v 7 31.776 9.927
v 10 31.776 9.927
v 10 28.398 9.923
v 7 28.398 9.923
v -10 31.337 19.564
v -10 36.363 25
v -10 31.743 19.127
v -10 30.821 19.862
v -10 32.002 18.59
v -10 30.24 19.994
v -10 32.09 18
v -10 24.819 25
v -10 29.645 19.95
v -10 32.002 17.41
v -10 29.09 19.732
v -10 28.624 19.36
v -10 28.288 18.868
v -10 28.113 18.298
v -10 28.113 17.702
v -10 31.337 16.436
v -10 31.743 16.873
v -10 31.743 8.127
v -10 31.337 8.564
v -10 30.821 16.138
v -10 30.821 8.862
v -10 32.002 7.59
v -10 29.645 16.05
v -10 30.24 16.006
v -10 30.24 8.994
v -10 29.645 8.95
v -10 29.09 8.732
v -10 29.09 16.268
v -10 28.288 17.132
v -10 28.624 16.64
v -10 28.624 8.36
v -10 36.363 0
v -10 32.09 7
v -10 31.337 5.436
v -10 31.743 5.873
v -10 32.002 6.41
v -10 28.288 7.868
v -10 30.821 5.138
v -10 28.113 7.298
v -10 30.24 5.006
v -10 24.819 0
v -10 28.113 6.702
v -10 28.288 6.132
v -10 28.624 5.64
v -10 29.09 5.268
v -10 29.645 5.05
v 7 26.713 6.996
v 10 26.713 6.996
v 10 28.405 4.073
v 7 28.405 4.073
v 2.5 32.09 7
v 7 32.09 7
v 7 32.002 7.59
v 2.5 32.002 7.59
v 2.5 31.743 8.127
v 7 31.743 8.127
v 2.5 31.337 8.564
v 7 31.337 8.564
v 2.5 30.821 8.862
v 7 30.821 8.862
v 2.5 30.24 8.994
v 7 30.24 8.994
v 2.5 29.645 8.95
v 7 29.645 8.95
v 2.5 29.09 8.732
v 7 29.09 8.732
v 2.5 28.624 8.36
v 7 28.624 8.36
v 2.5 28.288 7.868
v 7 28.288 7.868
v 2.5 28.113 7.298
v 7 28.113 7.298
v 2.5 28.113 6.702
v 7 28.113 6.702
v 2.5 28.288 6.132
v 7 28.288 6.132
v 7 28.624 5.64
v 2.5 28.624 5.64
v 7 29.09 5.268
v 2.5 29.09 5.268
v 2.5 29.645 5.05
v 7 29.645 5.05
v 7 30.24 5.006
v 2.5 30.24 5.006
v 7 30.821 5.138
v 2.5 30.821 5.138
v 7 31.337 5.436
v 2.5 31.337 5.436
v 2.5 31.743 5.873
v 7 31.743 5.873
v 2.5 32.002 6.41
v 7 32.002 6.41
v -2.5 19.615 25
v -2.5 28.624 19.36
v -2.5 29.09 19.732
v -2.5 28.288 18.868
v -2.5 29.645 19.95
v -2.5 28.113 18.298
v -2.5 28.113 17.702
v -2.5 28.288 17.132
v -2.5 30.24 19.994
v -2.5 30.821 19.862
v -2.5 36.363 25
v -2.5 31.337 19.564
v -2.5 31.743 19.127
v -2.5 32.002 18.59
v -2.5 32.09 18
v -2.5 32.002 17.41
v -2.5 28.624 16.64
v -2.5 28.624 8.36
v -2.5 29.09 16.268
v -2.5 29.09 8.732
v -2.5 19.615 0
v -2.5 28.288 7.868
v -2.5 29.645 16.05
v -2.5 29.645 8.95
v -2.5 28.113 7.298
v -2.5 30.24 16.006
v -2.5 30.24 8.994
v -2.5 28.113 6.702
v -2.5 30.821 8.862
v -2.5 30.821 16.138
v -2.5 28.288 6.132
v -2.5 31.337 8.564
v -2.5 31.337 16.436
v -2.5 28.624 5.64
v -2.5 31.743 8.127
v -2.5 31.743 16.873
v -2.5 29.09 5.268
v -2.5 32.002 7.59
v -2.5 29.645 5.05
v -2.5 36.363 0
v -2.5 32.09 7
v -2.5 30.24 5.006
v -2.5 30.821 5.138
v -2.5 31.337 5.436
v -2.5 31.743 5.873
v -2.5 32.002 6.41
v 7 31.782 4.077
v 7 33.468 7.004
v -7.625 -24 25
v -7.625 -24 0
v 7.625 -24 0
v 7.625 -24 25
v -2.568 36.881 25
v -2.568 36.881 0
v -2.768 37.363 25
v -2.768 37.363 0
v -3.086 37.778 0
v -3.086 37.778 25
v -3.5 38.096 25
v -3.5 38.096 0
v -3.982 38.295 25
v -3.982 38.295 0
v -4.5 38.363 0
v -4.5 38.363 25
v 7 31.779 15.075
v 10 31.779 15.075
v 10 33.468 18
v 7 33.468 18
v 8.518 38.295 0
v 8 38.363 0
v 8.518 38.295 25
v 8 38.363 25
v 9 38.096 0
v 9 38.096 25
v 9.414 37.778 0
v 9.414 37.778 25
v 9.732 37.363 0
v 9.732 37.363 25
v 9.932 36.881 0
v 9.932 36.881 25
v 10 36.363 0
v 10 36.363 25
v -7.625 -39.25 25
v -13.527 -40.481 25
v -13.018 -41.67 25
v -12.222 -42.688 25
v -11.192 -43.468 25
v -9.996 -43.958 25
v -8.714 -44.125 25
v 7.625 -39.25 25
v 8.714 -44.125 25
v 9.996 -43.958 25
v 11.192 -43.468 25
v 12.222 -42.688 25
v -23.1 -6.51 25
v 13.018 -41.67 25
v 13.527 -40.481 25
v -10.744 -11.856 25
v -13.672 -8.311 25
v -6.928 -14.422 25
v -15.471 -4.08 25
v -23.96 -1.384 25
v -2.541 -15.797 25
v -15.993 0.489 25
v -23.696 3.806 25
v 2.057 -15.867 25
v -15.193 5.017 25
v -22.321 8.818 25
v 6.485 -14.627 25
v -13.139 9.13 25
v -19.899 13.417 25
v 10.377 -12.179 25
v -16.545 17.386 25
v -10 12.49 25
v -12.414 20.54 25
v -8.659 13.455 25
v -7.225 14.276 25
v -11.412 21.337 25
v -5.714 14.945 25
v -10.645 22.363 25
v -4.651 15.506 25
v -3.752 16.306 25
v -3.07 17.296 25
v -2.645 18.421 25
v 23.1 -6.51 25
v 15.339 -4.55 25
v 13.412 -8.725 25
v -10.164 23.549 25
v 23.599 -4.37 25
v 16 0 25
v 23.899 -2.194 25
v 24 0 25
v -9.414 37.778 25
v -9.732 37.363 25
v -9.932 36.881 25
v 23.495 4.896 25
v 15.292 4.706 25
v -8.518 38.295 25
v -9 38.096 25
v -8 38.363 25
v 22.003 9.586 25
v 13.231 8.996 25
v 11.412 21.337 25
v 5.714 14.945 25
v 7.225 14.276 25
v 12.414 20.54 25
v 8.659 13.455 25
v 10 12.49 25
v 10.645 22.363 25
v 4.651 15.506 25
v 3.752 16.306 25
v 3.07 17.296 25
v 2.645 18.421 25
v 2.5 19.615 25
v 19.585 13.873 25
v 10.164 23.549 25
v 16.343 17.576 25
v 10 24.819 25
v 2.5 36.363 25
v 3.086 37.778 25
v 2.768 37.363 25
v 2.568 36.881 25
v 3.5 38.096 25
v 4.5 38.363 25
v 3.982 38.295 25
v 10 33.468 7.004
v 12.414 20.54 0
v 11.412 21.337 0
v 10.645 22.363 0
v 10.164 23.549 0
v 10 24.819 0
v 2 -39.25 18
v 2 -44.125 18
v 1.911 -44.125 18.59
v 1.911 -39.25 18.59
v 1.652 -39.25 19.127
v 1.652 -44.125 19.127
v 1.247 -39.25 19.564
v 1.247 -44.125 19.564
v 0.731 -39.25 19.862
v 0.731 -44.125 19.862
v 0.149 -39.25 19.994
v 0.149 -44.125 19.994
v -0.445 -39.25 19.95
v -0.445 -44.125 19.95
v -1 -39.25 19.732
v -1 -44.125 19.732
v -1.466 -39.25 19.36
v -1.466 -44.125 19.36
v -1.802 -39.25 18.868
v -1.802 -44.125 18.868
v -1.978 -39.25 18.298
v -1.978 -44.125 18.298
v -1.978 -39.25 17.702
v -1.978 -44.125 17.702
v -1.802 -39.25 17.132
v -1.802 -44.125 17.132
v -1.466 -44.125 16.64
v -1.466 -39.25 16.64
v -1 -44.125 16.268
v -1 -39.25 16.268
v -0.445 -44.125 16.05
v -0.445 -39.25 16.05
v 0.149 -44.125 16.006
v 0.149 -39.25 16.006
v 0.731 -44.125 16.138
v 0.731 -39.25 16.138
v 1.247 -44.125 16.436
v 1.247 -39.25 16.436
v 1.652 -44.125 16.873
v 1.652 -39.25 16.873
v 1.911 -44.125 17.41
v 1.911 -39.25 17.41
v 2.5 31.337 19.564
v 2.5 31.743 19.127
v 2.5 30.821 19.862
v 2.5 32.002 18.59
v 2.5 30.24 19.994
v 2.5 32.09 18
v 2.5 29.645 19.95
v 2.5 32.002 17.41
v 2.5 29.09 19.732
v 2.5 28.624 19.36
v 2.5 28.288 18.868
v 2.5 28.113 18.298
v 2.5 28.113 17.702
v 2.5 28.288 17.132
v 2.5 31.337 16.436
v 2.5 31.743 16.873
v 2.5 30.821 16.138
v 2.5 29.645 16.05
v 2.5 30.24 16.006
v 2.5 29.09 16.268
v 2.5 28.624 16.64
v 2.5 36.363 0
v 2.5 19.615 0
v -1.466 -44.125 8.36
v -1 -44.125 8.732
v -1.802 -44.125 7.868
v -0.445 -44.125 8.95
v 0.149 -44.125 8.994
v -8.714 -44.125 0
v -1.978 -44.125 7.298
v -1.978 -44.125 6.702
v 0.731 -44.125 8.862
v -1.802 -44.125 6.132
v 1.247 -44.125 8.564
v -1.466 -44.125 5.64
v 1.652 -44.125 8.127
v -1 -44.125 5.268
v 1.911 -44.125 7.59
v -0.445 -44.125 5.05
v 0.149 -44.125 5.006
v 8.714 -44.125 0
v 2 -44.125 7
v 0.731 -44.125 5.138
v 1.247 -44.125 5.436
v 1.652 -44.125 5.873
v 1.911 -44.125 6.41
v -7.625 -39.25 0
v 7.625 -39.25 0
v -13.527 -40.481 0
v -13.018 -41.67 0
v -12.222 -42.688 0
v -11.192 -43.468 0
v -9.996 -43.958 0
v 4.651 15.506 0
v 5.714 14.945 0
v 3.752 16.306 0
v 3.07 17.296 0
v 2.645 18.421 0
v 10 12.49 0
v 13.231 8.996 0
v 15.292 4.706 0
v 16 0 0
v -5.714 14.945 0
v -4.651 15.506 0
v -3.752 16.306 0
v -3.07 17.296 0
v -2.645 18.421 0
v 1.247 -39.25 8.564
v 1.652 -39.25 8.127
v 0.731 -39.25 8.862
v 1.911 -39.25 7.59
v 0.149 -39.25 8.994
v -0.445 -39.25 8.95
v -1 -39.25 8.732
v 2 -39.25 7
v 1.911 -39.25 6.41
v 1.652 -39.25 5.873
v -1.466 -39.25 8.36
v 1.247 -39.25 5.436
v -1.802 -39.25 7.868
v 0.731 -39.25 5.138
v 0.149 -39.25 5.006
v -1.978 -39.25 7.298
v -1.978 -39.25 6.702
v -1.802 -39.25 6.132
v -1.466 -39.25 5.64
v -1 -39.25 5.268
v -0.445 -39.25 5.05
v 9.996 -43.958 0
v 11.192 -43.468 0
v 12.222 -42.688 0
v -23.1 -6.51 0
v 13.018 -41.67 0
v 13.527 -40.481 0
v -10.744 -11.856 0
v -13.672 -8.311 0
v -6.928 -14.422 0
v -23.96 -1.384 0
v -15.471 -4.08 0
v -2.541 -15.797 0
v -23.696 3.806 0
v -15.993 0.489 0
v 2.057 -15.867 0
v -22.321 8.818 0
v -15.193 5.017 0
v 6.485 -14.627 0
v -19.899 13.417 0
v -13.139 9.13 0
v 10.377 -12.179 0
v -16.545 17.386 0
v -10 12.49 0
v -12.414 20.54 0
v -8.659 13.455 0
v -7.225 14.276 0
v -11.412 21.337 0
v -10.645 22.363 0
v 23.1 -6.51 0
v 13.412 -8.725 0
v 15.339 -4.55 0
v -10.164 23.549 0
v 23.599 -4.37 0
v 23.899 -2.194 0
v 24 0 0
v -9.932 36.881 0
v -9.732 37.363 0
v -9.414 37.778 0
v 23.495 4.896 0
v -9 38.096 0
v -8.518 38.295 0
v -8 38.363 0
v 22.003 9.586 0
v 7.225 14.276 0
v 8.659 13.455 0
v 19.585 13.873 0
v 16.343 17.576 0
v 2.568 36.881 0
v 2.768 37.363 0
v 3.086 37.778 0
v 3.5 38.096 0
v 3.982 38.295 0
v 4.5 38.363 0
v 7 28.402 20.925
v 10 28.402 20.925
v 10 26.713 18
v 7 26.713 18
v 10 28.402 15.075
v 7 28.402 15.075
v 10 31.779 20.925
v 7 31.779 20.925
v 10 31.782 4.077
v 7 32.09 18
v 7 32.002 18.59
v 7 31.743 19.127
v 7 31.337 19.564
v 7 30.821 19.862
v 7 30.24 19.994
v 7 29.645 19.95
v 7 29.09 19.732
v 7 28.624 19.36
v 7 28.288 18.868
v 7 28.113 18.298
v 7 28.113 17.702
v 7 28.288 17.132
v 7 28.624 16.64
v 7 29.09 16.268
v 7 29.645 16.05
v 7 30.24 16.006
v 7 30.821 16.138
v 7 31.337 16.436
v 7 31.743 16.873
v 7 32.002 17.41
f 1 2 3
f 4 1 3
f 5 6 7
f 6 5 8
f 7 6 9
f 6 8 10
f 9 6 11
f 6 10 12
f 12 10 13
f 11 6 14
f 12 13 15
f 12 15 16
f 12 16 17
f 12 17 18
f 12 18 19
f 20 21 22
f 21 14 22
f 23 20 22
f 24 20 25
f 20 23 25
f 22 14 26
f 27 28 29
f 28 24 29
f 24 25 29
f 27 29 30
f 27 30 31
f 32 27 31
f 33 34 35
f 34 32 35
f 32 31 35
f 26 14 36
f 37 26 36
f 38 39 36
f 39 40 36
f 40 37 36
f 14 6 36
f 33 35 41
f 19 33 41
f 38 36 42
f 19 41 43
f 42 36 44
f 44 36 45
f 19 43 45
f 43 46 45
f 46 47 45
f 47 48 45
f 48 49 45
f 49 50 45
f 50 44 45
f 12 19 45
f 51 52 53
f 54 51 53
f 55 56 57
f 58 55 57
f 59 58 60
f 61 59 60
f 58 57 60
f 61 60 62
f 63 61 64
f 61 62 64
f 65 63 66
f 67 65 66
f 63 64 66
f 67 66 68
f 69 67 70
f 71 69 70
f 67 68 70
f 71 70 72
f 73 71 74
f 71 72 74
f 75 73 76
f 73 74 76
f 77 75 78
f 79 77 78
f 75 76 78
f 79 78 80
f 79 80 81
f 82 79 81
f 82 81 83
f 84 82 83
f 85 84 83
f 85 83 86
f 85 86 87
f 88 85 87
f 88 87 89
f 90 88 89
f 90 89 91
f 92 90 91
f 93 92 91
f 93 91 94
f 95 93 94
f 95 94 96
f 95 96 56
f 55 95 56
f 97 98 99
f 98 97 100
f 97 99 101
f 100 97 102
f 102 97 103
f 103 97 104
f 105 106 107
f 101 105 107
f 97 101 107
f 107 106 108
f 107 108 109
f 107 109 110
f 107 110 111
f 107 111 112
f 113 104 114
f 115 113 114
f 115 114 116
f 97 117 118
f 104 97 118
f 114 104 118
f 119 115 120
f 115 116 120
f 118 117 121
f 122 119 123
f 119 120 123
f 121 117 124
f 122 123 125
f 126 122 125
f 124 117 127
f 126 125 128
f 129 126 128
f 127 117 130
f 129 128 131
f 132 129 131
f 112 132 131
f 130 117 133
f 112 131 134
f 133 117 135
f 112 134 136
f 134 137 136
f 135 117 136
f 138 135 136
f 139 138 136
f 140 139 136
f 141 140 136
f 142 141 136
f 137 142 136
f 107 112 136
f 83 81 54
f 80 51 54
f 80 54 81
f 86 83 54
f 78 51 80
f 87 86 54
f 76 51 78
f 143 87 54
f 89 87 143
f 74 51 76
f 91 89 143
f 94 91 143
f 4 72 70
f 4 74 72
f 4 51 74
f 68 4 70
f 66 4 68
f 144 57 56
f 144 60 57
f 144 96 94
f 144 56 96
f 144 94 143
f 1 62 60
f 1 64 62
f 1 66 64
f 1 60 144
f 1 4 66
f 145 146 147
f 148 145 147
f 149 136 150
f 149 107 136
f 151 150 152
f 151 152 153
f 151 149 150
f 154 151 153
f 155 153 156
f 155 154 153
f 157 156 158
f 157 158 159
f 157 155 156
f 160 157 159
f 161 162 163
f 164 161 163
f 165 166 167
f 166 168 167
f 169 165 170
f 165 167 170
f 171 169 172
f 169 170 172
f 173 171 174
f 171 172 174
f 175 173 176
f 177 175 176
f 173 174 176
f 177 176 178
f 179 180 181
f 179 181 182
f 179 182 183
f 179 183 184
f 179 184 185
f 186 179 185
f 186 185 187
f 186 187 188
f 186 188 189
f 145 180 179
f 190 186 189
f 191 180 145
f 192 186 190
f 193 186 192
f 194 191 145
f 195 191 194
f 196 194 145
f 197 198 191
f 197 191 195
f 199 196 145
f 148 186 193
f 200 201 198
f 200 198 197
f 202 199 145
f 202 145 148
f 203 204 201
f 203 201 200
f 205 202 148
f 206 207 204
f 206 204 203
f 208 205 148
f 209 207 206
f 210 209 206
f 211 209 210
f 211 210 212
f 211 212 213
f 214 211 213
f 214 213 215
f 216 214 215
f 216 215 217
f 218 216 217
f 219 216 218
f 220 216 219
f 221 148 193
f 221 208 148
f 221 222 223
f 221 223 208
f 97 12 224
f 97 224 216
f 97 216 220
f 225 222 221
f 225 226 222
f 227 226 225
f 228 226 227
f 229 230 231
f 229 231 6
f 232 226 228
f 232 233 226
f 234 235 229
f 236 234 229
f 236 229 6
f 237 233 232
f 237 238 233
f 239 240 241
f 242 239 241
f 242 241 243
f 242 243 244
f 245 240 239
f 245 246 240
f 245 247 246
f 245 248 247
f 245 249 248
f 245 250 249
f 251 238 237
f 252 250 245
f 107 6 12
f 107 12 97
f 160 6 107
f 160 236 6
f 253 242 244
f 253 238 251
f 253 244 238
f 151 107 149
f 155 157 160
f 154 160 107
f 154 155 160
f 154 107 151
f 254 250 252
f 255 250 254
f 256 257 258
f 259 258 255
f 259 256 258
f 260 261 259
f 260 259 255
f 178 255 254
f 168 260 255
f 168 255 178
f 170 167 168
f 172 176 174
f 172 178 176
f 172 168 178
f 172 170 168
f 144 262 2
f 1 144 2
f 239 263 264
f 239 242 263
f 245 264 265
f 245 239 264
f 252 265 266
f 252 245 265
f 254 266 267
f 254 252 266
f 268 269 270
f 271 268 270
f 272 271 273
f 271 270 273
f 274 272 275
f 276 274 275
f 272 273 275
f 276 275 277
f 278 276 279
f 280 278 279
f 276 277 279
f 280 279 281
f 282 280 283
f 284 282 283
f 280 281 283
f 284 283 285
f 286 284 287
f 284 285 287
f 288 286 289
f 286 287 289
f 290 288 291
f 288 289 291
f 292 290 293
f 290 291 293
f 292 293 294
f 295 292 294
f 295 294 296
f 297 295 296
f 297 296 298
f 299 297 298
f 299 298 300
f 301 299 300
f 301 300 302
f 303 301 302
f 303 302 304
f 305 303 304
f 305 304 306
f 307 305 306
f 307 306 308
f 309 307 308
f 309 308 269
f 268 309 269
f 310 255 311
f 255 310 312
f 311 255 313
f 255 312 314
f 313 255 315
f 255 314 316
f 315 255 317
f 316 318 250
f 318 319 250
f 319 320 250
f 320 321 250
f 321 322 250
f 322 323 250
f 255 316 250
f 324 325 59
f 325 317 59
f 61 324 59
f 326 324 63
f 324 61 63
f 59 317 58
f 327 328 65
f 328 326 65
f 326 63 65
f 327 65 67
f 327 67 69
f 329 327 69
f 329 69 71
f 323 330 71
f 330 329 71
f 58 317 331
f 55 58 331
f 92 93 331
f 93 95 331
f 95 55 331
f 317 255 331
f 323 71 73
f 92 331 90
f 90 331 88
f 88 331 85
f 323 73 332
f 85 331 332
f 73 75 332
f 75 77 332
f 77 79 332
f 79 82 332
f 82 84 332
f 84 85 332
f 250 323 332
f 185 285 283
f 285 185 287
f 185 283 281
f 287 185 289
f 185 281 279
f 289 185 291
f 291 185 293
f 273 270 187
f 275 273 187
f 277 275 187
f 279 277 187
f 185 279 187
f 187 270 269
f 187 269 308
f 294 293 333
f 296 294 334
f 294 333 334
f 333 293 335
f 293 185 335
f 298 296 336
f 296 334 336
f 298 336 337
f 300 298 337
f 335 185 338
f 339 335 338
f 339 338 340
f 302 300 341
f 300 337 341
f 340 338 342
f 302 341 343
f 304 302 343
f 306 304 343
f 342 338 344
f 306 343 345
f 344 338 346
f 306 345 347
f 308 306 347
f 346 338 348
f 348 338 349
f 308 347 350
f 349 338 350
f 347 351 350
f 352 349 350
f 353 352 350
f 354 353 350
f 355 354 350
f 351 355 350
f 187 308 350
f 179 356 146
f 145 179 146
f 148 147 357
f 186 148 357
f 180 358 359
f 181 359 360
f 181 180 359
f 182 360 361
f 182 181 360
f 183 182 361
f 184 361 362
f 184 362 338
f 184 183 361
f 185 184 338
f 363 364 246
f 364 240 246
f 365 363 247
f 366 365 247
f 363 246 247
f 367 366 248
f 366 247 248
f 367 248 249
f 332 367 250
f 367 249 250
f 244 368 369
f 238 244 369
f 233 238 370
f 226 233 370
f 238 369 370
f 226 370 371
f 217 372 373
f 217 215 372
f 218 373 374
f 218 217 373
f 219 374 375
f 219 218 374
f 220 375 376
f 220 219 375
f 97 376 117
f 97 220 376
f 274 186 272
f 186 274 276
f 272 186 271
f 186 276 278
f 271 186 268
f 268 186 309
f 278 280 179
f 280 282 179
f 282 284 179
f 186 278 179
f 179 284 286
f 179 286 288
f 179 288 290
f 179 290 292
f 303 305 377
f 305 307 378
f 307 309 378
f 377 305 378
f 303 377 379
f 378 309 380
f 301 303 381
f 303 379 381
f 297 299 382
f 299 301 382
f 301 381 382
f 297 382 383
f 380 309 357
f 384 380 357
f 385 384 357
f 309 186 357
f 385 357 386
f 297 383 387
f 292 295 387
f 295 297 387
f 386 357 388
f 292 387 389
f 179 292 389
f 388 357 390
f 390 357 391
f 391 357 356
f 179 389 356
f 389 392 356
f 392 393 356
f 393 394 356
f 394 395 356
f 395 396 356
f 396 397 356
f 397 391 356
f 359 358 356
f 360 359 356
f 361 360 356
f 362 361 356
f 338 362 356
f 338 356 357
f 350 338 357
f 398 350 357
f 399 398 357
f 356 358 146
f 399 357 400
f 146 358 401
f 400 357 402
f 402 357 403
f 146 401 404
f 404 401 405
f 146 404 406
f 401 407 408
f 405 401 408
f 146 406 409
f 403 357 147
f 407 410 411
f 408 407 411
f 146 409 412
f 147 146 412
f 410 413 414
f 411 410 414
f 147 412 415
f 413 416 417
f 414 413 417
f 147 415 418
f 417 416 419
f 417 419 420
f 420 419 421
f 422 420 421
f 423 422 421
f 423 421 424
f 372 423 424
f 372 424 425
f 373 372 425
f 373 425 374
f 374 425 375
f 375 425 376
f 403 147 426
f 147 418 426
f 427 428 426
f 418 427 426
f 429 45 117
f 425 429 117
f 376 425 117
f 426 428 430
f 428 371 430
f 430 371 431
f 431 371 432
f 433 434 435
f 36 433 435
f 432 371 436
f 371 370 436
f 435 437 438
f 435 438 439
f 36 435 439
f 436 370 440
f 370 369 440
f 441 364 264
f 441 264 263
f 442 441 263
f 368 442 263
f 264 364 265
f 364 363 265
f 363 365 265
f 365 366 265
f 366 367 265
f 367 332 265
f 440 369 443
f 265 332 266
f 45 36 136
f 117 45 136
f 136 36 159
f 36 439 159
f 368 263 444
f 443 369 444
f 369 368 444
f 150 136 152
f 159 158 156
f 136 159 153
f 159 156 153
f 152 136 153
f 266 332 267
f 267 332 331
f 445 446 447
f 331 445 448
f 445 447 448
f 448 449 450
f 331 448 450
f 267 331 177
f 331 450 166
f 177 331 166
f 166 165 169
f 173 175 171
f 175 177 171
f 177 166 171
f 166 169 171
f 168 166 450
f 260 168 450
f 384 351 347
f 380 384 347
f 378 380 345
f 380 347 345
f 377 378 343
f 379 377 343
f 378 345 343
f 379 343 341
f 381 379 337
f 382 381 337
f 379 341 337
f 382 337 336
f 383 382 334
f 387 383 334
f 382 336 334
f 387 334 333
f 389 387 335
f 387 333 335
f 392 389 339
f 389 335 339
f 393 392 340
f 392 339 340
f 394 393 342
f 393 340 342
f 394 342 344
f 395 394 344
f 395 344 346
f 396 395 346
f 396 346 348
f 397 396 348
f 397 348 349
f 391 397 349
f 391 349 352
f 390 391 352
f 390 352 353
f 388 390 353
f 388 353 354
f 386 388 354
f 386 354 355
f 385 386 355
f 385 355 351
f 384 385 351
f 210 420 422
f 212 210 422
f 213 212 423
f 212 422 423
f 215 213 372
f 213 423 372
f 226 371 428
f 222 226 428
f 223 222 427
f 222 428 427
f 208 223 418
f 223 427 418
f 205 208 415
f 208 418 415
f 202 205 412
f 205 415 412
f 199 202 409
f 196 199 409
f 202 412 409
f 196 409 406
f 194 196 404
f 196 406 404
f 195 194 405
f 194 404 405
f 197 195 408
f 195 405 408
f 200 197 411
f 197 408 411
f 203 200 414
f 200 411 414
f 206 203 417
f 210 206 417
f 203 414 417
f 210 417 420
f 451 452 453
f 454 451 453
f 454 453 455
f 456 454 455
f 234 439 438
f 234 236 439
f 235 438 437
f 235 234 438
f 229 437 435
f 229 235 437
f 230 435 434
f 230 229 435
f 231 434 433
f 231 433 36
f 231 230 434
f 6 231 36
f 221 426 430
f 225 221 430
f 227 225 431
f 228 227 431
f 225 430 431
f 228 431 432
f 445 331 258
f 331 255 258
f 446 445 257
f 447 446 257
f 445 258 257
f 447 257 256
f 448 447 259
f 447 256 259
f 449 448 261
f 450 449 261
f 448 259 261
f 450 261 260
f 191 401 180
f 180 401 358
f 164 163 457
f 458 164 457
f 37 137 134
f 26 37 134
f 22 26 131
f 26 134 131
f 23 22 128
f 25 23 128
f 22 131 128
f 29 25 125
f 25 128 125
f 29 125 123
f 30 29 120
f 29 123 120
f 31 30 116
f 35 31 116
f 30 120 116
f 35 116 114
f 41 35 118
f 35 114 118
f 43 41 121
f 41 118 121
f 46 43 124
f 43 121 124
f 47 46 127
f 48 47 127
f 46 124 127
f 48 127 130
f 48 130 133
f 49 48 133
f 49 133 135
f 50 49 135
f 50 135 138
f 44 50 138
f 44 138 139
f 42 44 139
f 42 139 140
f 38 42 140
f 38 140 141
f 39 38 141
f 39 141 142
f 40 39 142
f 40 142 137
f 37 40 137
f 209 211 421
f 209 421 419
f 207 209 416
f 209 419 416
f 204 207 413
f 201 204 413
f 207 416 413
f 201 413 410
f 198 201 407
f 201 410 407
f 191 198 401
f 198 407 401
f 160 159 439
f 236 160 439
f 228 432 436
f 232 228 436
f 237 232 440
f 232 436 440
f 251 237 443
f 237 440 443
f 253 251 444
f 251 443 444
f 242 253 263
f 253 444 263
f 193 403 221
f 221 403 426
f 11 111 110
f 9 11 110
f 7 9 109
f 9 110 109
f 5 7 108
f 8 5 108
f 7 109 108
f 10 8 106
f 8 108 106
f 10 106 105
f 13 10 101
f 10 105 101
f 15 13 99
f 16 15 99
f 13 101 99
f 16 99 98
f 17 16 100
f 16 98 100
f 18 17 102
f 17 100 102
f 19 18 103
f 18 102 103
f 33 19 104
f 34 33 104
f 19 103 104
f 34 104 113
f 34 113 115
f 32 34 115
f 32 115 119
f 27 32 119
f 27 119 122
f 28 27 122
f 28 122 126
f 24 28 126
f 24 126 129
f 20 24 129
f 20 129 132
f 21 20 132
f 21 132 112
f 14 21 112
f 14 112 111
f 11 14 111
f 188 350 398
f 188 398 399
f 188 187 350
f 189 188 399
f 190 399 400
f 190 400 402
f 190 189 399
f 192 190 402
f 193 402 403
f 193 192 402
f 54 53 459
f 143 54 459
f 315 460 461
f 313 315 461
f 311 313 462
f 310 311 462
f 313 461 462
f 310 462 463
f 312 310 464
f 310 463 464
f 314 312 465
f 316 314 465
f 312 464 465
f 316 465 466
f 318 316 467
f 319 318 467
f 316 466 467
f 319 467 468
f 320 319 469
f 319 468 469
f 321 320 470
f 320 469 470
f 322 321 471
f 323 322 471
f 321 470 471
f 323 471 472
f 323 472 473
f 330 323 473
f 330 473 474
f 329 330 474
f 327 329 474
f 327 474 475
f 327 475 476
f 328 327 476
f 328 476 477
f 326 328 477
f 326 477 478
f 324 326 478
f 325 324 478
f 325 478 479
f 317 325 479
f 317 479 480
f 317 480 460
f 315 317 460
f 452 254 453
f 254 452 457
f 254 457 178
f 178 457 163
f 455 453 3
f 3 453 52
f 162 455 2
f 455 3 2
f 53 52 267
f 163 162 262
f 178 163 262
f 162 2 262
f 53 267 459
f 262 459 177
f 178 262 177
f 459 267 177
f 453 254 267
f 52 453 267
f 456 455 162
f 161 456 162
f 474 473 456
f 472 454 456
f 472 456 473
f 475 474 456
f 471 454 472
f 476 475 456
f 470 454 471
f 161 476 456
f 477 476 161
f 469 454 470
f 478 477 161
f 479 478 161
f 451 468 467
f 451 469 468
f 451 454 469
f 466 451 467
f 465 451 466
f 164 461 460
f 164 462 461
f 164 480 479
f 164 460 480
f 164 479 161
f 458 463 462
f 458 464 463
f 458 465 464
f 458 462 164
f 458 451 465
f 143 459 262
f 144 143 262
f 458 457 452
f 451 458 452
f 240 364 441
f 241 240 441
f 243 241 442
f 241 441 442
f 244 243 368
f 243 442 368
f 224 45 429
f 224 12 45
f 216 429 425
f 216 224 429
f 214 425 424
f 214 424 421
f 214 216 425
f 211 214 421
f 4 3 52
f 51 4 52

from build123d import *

# Parameters (mm, degrees)
F1_DEPTH = 25
F3_R     = 2
F4_DEPTH = 10
F2_R     = 2
F5_DEPTH = 50
F6_R     = 5
F7_R     = 2
F8_DEPTH = 3


with BuildPart() as f1:
    # F0 (on Top) → F1 (new body)
    with BuildSketch(Plane.XY):
        with BuildLine():
            ThreePointArc((10, 12.4899959968), (14.4222051019, 6.9282032303), (16, 0))
            ThreePointArc((16, 0), (-6.9282032303, -14.4222051019), (-10, 12.4899959968))
            Line((-10, 12.4899959968), (-10, 21.8174242293))
            ThreePointArc((-10, 21.8174242293), (-21.7833717136, 10.0739623181), (-23.1002589039, -6.5098416703))
            ThreePointArc((-23.1002589039, -6.5098416703), (-19.1230344611, -14.5020534064), (-12.5, -20.4878012485))
            Line((-12.5, -20.4878012485), (-12.5, -19.125))
            Line((-12.5, -19.125), (12.5, -19.125))
            Line((12.5, -19.125), (12.5, -20.4878012485))
            ThreePointArc((12.5, -20.4878012485), (19.1230344611, -14.5020534064), (23.1002589039, -6.5098416703))
            ThreePointArc((23.1002589039, -6.5098416703), (23.7740006488, -3.2858626193), (24, 0))
            ThreePointArc((24, 0), (20.1990098767, 12.9614813968), (10, 21.8174242293))
            Line((10, 21.8174242293), (10, 12.4899959968))
        make_face()
        with BuildLine():
            Line((-10, 21.8174242293), (-10, 12.4899959968))
            ThreePointArc((-10, 12.4899959968), (-6.4658560997, 14.635323874), (-2.5, 15.8034806293))
            Line((-2.5, 15.8034806293), (-2.5, 23.8694365246))
            ThreePointArc((-2.5, 23.8694365246), (-6.3336552334, 23.1491859767), (-10, 21.8174242293))
        make_face()
        with BuildLine():
            Line((-10, 38.3634492755), (-10, 21.8174242293))
            ThreePointArc((-10, 21.8174242293), (-6.3336552334, 23.1491859767), (-2.5, 23.8694365246))
            Line((-2.5, 23.8694365246), (-2.5, 38.3634492755))
            Line((-2.5, 38.3634492755), (-10, 38.3634492755))
        make_face()
        with BuildLine():
            ThreePointArc((2.5, 15.8034806293), (6.4658560997, 14.635323874), (10, 12.4899959968))
            Line((10, 12.4899959968), (10, 21.8174242293))
            ThreePointArc((10, 21.8174242293), (6.3336552334, 23.1491859767), (2.5, 23.8694365246))
            Line((2.5, 23.8694365246), (2.5, 15.8034806293))
        make_face()
        with BuildLine():
            ThreePointArc((2.5, 23.8694365246), (6.3336552334, 23.1491859767), (10, 21.8174242293))
            Line((10, 21.8174242293), (10, 38.3634492755))
            Line((10, 38.3634492755), (2.5, 38.3634492755))
            Line((2.5, 38.3634492755), (2.5, 23.8694365246))
        make_face()
        with BuildLine():
            Line((-12.5, -19.125), (-12.5, -20.4878012485))
            ThreePointArc((-12.5, -20.4878012485), (-6.492024724, -23.1052724499), (0, -24))
            ThreePointArc((0, -24), (6.492024724, -23.1052724499), (12.5, -20.4878012485))
            Line((12.5, -20.4878012485), (12.5, -19.125))
            Line((12.5, -19.125), (-12.5, -19.125))
        make_face()
        with BuildLine():
            ThreePointArc((-12.5, -20.4878012485), (-19.1230344611, -14.5020534064), (-23.1002589039, -6.5098416703))
            Line((-23.1002589039, -6.5098416703), (-12.5, -44.125))
            Line((-12.5, -44.125), (-12.5, -20.4878012485))
        make_face()
        with BuildLine():
            ThreePointArc((0, -24), (-6.492024724, -23.1052724499), (-12.5, -20.4878012485))
            Line((-12.5, -20.4878012485), (-12.5, -44.125))
            Line((-12.5, -44.125), (12.5, -44.125))
            Line((12.5, -44.125), (12.5, -20.4878012485))
            ThreePointArc((12.5, -20.4878012485), (6.492024724, -23.1052724499), (0, -24))
        make_face()
        Polygon((-7.625, -24), (0, -24), (7.625, -24), (7.625, -39.25), (-7.625, -39.25), align=None, mode=Mode.SUBTRACT)
        with BuildLine():
            Line((12.5, -44.125), (23.1002589039, -6.5098416703))
            ThreePointArc((23.1002589039, -6.5098416703), (19.1230344611, -14.5020534064), (12.5, -20.4878012485))
            Line((12.5, -20.4878012485), (12.5, -44.125))
        make_face()
    extrude(amount=F1_DEPTH)

    # F3 (on face) → F4 (cut)
    with BuildSketch(Plane.XZ.offset(44.125)):
        with Locations((0, 7)):
            Circle(F3_R)
        with Locations((0, 18)):
            Circle(F3_R)
    extrude(amount=-F4_DEPTH, mode=Mode.SUBTRACT)

    # F2 (on face) → F5 (cut)
    with BuildSketch(Plane.YZ.offset(10)):
        with Locations((30.0904367524, 18)):
            Circle(F2_R)
        with Locations((30.0904367524, 7)):
            Circle(F2_R)
    extrude(amount=-F5_DEPTH, mode=Mode.SUBTRACT)

    # F6
    f6_edges = [f1.edges().sort_by_distance(p)[0] for p in [
        (12.5, -44.125, 12.5),
        (-12.5, -44.125, 12.5),
        (10, 21.817424, 12.5),
        (-10, 21.817424, 12.5),
        (-2.5, 15.803481, 12.5),
        (2.5, 15.803481, 12.5),
    ]]
    fillet(f6_edges, radius=F6_R)

    # F7
    f7_edges = [f1.edges().sort_by_distance(p)[0] for p in [
        (10, 38.363449, 12.5),
        (-10, 38.363449, 12.5),
        (-2.5, 38.363449, 12.5),
        (2.5, 38.363449, 12.5),
    ]]
    fillet(f7_edges, radius=F7_R)

    # F2 (on face) → F8 (cut)
    with BuildSketch(Plane.YZ.offset(10)):
        Polygon((33.4679358271, 18), (31.7791862898, 20.925), (28.401687215, 20.925), (26.7129376776, 18), (28.401687215, 15.075), (31.7791862898, 15.075), align=None)
        with Locations((30.0904367524, 18)):
            Circle(F2_R, mode=Mode.SUBTRACT)
        Polygon((33.4679337645, 7.0037327168), (31.7759526309, 9.9268645721), (28.3984556188, 9.9231318553), (26.7129397403, 6.9962672832), (28.4049208739, 4.0731354279), (31.782417886, 4.0768681447), align=None)
        with Locations((30.0904367524, 7)):
            Circle(F2_R, mode=Mode.SUBTRACT)
    extrude(amount=-F8_DEPTH, mode=Mode.SUBTRACT)


solid = f1.part
